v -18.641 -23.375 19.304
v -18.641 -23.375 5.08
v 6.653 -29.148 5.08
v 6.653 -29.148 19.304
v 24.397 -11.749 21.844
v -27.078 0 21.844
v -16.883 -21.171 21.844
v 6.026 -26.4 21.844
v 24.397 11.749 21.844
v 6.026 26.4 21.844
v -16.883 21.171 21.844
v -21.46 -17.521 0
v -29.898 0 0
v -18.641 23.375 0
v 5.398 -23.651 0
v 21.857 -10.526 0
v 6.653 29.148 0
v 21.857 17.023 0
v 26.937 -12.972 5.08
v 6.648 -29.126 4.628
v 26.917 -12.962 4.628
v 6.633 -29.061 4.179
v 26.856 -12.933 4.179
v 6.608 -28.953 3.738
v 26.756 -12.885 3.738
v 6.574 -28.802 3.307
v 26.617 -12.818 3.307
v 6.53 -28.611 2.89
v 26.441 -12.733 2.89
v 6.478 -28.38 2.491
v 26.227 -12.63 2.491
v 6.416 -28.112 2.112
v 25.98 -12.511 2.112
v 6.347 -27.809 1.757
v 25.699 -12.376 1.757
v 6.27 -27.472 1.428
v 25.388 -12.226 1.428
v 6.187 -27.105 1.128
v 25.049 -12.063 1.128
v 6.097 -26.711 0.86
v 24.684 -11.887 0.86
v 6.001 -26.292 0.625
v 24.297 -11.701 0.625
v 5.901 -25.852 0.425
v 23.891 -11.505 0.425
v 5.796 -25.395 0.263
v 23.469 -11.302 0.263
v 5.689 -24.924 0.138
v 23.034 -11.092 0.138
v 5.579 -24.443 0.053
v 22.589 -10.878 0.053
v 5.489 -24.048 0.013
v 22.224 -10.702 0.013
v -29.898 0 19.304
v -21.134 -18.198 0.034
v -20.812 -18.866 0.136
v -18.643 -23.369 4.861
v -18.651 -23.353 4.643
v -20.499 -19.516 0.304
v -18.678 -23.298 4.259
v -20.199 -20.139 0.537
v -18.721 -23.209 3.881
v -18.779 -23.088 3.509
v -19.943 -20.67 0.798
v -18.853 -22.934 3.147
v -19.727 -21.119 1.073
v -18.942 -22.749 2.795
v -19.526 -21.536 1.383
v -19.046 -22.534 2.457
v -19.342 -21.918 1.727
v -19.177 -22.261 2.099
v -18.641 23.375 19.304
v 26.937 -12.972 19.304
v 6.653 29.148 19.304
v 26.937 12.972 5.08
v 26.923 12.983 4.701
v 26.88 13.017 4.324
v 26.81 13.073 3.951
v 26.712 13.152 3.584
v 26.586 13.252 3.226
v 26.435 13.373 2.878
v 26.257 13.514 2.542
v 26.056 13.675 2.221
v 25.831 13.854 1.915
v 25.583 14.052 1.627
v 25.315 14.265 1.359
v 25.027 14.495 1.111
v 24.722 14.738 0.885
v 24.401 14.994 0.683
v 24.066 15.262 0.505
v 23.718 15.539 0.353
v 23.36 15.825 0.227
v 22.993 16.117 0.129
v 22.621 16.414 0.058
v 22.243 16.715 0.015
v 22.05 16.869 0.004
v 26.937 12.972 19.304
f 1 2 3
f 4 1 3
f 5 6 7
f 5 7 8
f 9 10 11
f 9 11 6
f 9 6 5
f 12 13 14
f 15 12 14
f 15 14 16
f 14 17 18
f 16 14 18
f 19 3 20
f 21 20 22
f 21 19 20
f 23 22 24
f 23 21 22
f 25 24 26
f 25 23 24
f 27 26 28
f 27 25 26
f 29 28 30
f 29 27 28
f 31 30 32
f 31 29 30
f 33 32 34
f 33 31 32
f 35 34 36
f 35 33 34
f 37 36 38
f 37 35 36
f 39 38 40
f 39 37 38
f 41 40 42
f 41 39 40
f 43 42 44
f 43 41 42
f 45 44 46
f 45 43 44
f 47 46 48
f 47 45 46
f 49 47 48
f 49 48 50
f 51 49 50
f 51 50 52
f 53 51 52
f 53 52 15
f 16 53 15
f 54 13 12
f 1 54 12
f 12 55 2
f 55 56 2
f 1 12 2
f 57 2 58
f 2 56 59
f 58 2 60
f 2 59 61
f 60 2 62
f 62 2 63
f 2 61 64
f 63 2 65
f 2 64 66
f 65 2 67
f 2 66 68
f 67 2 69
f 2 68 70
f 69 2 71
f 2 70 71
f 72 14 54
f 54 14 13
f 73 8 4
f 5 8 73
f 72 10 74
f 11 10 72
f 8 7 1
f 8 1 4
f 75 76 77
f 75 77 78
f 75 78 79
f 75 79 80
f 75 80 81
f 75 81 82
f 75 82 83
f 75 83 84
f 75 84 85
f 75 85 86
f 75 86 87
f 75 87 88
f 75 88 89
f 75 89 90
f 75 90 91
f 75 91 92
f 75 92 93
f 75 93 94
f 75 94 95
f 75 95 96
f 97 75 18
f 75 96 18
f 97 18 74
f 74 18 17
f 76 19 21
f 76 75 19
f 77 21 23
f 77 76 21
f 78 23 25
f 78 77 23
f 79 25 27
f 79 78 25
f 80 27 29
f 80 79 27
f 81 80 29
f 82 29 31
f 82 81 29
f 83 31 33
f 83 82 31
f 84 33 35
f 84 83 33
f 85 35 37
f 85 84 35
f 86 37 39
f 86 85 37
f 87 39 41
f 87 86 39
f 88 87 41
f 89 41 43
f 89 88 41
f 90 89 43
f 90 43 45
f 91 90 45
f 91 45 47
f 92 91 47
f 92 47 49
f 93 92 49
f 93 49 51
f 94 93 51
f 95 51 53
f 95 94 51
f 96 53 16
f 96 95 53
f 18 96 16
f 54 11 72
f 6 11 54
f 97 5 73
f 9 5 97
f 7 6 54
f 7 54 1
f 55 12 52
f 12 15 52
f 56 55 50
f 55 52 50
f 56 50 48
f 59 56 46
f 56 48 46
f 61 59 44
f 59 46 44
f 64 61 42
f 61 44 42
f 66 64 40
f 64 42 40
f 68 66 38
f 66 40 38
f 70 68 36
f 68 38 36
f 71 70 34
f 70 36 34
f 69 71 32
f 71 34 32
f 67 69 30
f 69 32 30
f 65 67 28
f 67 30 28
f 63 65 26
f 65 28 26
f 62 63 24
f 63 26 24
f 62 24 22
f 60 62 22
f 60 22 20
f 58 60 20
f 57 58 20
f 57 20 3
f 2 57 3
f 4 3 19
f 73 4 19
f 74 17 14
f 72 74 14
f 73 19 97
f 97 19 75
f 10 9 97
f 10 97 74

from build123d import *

# Parameters (mm, degrees)
F1_DEPTH = 21.844
F2_SIZE  = 2.54
F3_R     = 5.08


with BuildPart() as f1:
    # F0 (on Top) → F1 (new body)
    with BuildSketch(Plane.XY):
        Polygon((26.936827, -12.972092), (26.936827, 12.972092), (6.652847, 29.148027), (-18.640863, 23.374903), (-29.897623, 0), (-18.640863, -23.374903), (6.652847, -29.148027), align=None)
    extrude(amount=F1_DEPTH)

    # F2
    f2_edges = [f1.edges().sort_by_distance(p)[0] for p in [
        (26.936827, 0, 21.844),
        (16.794837, -21.06006, 21.844),
        (-5.994008, -26.261465, 21.844),
        (-24.269243, -11.687451, 21.844),
        (-24.269243, 11.687451, 21.844),
        (-5.994008, 26.261465, 21.844),
        (16.794837, 21.06006, 21.844),
    ]]
    chamfer(f2_edges, length=F2_SIZE)

    # F3
    f3_edges = [f1.edges().sort_by_distance(p)[0] for p in [
        (16.794837, -21.06006, 0),
        (26.936827, 0, 0),
        (-5.994008, -26.261465, 0),
    ]]
    fillet(f3_edges, radius=F3_R)


solid = f1.part
